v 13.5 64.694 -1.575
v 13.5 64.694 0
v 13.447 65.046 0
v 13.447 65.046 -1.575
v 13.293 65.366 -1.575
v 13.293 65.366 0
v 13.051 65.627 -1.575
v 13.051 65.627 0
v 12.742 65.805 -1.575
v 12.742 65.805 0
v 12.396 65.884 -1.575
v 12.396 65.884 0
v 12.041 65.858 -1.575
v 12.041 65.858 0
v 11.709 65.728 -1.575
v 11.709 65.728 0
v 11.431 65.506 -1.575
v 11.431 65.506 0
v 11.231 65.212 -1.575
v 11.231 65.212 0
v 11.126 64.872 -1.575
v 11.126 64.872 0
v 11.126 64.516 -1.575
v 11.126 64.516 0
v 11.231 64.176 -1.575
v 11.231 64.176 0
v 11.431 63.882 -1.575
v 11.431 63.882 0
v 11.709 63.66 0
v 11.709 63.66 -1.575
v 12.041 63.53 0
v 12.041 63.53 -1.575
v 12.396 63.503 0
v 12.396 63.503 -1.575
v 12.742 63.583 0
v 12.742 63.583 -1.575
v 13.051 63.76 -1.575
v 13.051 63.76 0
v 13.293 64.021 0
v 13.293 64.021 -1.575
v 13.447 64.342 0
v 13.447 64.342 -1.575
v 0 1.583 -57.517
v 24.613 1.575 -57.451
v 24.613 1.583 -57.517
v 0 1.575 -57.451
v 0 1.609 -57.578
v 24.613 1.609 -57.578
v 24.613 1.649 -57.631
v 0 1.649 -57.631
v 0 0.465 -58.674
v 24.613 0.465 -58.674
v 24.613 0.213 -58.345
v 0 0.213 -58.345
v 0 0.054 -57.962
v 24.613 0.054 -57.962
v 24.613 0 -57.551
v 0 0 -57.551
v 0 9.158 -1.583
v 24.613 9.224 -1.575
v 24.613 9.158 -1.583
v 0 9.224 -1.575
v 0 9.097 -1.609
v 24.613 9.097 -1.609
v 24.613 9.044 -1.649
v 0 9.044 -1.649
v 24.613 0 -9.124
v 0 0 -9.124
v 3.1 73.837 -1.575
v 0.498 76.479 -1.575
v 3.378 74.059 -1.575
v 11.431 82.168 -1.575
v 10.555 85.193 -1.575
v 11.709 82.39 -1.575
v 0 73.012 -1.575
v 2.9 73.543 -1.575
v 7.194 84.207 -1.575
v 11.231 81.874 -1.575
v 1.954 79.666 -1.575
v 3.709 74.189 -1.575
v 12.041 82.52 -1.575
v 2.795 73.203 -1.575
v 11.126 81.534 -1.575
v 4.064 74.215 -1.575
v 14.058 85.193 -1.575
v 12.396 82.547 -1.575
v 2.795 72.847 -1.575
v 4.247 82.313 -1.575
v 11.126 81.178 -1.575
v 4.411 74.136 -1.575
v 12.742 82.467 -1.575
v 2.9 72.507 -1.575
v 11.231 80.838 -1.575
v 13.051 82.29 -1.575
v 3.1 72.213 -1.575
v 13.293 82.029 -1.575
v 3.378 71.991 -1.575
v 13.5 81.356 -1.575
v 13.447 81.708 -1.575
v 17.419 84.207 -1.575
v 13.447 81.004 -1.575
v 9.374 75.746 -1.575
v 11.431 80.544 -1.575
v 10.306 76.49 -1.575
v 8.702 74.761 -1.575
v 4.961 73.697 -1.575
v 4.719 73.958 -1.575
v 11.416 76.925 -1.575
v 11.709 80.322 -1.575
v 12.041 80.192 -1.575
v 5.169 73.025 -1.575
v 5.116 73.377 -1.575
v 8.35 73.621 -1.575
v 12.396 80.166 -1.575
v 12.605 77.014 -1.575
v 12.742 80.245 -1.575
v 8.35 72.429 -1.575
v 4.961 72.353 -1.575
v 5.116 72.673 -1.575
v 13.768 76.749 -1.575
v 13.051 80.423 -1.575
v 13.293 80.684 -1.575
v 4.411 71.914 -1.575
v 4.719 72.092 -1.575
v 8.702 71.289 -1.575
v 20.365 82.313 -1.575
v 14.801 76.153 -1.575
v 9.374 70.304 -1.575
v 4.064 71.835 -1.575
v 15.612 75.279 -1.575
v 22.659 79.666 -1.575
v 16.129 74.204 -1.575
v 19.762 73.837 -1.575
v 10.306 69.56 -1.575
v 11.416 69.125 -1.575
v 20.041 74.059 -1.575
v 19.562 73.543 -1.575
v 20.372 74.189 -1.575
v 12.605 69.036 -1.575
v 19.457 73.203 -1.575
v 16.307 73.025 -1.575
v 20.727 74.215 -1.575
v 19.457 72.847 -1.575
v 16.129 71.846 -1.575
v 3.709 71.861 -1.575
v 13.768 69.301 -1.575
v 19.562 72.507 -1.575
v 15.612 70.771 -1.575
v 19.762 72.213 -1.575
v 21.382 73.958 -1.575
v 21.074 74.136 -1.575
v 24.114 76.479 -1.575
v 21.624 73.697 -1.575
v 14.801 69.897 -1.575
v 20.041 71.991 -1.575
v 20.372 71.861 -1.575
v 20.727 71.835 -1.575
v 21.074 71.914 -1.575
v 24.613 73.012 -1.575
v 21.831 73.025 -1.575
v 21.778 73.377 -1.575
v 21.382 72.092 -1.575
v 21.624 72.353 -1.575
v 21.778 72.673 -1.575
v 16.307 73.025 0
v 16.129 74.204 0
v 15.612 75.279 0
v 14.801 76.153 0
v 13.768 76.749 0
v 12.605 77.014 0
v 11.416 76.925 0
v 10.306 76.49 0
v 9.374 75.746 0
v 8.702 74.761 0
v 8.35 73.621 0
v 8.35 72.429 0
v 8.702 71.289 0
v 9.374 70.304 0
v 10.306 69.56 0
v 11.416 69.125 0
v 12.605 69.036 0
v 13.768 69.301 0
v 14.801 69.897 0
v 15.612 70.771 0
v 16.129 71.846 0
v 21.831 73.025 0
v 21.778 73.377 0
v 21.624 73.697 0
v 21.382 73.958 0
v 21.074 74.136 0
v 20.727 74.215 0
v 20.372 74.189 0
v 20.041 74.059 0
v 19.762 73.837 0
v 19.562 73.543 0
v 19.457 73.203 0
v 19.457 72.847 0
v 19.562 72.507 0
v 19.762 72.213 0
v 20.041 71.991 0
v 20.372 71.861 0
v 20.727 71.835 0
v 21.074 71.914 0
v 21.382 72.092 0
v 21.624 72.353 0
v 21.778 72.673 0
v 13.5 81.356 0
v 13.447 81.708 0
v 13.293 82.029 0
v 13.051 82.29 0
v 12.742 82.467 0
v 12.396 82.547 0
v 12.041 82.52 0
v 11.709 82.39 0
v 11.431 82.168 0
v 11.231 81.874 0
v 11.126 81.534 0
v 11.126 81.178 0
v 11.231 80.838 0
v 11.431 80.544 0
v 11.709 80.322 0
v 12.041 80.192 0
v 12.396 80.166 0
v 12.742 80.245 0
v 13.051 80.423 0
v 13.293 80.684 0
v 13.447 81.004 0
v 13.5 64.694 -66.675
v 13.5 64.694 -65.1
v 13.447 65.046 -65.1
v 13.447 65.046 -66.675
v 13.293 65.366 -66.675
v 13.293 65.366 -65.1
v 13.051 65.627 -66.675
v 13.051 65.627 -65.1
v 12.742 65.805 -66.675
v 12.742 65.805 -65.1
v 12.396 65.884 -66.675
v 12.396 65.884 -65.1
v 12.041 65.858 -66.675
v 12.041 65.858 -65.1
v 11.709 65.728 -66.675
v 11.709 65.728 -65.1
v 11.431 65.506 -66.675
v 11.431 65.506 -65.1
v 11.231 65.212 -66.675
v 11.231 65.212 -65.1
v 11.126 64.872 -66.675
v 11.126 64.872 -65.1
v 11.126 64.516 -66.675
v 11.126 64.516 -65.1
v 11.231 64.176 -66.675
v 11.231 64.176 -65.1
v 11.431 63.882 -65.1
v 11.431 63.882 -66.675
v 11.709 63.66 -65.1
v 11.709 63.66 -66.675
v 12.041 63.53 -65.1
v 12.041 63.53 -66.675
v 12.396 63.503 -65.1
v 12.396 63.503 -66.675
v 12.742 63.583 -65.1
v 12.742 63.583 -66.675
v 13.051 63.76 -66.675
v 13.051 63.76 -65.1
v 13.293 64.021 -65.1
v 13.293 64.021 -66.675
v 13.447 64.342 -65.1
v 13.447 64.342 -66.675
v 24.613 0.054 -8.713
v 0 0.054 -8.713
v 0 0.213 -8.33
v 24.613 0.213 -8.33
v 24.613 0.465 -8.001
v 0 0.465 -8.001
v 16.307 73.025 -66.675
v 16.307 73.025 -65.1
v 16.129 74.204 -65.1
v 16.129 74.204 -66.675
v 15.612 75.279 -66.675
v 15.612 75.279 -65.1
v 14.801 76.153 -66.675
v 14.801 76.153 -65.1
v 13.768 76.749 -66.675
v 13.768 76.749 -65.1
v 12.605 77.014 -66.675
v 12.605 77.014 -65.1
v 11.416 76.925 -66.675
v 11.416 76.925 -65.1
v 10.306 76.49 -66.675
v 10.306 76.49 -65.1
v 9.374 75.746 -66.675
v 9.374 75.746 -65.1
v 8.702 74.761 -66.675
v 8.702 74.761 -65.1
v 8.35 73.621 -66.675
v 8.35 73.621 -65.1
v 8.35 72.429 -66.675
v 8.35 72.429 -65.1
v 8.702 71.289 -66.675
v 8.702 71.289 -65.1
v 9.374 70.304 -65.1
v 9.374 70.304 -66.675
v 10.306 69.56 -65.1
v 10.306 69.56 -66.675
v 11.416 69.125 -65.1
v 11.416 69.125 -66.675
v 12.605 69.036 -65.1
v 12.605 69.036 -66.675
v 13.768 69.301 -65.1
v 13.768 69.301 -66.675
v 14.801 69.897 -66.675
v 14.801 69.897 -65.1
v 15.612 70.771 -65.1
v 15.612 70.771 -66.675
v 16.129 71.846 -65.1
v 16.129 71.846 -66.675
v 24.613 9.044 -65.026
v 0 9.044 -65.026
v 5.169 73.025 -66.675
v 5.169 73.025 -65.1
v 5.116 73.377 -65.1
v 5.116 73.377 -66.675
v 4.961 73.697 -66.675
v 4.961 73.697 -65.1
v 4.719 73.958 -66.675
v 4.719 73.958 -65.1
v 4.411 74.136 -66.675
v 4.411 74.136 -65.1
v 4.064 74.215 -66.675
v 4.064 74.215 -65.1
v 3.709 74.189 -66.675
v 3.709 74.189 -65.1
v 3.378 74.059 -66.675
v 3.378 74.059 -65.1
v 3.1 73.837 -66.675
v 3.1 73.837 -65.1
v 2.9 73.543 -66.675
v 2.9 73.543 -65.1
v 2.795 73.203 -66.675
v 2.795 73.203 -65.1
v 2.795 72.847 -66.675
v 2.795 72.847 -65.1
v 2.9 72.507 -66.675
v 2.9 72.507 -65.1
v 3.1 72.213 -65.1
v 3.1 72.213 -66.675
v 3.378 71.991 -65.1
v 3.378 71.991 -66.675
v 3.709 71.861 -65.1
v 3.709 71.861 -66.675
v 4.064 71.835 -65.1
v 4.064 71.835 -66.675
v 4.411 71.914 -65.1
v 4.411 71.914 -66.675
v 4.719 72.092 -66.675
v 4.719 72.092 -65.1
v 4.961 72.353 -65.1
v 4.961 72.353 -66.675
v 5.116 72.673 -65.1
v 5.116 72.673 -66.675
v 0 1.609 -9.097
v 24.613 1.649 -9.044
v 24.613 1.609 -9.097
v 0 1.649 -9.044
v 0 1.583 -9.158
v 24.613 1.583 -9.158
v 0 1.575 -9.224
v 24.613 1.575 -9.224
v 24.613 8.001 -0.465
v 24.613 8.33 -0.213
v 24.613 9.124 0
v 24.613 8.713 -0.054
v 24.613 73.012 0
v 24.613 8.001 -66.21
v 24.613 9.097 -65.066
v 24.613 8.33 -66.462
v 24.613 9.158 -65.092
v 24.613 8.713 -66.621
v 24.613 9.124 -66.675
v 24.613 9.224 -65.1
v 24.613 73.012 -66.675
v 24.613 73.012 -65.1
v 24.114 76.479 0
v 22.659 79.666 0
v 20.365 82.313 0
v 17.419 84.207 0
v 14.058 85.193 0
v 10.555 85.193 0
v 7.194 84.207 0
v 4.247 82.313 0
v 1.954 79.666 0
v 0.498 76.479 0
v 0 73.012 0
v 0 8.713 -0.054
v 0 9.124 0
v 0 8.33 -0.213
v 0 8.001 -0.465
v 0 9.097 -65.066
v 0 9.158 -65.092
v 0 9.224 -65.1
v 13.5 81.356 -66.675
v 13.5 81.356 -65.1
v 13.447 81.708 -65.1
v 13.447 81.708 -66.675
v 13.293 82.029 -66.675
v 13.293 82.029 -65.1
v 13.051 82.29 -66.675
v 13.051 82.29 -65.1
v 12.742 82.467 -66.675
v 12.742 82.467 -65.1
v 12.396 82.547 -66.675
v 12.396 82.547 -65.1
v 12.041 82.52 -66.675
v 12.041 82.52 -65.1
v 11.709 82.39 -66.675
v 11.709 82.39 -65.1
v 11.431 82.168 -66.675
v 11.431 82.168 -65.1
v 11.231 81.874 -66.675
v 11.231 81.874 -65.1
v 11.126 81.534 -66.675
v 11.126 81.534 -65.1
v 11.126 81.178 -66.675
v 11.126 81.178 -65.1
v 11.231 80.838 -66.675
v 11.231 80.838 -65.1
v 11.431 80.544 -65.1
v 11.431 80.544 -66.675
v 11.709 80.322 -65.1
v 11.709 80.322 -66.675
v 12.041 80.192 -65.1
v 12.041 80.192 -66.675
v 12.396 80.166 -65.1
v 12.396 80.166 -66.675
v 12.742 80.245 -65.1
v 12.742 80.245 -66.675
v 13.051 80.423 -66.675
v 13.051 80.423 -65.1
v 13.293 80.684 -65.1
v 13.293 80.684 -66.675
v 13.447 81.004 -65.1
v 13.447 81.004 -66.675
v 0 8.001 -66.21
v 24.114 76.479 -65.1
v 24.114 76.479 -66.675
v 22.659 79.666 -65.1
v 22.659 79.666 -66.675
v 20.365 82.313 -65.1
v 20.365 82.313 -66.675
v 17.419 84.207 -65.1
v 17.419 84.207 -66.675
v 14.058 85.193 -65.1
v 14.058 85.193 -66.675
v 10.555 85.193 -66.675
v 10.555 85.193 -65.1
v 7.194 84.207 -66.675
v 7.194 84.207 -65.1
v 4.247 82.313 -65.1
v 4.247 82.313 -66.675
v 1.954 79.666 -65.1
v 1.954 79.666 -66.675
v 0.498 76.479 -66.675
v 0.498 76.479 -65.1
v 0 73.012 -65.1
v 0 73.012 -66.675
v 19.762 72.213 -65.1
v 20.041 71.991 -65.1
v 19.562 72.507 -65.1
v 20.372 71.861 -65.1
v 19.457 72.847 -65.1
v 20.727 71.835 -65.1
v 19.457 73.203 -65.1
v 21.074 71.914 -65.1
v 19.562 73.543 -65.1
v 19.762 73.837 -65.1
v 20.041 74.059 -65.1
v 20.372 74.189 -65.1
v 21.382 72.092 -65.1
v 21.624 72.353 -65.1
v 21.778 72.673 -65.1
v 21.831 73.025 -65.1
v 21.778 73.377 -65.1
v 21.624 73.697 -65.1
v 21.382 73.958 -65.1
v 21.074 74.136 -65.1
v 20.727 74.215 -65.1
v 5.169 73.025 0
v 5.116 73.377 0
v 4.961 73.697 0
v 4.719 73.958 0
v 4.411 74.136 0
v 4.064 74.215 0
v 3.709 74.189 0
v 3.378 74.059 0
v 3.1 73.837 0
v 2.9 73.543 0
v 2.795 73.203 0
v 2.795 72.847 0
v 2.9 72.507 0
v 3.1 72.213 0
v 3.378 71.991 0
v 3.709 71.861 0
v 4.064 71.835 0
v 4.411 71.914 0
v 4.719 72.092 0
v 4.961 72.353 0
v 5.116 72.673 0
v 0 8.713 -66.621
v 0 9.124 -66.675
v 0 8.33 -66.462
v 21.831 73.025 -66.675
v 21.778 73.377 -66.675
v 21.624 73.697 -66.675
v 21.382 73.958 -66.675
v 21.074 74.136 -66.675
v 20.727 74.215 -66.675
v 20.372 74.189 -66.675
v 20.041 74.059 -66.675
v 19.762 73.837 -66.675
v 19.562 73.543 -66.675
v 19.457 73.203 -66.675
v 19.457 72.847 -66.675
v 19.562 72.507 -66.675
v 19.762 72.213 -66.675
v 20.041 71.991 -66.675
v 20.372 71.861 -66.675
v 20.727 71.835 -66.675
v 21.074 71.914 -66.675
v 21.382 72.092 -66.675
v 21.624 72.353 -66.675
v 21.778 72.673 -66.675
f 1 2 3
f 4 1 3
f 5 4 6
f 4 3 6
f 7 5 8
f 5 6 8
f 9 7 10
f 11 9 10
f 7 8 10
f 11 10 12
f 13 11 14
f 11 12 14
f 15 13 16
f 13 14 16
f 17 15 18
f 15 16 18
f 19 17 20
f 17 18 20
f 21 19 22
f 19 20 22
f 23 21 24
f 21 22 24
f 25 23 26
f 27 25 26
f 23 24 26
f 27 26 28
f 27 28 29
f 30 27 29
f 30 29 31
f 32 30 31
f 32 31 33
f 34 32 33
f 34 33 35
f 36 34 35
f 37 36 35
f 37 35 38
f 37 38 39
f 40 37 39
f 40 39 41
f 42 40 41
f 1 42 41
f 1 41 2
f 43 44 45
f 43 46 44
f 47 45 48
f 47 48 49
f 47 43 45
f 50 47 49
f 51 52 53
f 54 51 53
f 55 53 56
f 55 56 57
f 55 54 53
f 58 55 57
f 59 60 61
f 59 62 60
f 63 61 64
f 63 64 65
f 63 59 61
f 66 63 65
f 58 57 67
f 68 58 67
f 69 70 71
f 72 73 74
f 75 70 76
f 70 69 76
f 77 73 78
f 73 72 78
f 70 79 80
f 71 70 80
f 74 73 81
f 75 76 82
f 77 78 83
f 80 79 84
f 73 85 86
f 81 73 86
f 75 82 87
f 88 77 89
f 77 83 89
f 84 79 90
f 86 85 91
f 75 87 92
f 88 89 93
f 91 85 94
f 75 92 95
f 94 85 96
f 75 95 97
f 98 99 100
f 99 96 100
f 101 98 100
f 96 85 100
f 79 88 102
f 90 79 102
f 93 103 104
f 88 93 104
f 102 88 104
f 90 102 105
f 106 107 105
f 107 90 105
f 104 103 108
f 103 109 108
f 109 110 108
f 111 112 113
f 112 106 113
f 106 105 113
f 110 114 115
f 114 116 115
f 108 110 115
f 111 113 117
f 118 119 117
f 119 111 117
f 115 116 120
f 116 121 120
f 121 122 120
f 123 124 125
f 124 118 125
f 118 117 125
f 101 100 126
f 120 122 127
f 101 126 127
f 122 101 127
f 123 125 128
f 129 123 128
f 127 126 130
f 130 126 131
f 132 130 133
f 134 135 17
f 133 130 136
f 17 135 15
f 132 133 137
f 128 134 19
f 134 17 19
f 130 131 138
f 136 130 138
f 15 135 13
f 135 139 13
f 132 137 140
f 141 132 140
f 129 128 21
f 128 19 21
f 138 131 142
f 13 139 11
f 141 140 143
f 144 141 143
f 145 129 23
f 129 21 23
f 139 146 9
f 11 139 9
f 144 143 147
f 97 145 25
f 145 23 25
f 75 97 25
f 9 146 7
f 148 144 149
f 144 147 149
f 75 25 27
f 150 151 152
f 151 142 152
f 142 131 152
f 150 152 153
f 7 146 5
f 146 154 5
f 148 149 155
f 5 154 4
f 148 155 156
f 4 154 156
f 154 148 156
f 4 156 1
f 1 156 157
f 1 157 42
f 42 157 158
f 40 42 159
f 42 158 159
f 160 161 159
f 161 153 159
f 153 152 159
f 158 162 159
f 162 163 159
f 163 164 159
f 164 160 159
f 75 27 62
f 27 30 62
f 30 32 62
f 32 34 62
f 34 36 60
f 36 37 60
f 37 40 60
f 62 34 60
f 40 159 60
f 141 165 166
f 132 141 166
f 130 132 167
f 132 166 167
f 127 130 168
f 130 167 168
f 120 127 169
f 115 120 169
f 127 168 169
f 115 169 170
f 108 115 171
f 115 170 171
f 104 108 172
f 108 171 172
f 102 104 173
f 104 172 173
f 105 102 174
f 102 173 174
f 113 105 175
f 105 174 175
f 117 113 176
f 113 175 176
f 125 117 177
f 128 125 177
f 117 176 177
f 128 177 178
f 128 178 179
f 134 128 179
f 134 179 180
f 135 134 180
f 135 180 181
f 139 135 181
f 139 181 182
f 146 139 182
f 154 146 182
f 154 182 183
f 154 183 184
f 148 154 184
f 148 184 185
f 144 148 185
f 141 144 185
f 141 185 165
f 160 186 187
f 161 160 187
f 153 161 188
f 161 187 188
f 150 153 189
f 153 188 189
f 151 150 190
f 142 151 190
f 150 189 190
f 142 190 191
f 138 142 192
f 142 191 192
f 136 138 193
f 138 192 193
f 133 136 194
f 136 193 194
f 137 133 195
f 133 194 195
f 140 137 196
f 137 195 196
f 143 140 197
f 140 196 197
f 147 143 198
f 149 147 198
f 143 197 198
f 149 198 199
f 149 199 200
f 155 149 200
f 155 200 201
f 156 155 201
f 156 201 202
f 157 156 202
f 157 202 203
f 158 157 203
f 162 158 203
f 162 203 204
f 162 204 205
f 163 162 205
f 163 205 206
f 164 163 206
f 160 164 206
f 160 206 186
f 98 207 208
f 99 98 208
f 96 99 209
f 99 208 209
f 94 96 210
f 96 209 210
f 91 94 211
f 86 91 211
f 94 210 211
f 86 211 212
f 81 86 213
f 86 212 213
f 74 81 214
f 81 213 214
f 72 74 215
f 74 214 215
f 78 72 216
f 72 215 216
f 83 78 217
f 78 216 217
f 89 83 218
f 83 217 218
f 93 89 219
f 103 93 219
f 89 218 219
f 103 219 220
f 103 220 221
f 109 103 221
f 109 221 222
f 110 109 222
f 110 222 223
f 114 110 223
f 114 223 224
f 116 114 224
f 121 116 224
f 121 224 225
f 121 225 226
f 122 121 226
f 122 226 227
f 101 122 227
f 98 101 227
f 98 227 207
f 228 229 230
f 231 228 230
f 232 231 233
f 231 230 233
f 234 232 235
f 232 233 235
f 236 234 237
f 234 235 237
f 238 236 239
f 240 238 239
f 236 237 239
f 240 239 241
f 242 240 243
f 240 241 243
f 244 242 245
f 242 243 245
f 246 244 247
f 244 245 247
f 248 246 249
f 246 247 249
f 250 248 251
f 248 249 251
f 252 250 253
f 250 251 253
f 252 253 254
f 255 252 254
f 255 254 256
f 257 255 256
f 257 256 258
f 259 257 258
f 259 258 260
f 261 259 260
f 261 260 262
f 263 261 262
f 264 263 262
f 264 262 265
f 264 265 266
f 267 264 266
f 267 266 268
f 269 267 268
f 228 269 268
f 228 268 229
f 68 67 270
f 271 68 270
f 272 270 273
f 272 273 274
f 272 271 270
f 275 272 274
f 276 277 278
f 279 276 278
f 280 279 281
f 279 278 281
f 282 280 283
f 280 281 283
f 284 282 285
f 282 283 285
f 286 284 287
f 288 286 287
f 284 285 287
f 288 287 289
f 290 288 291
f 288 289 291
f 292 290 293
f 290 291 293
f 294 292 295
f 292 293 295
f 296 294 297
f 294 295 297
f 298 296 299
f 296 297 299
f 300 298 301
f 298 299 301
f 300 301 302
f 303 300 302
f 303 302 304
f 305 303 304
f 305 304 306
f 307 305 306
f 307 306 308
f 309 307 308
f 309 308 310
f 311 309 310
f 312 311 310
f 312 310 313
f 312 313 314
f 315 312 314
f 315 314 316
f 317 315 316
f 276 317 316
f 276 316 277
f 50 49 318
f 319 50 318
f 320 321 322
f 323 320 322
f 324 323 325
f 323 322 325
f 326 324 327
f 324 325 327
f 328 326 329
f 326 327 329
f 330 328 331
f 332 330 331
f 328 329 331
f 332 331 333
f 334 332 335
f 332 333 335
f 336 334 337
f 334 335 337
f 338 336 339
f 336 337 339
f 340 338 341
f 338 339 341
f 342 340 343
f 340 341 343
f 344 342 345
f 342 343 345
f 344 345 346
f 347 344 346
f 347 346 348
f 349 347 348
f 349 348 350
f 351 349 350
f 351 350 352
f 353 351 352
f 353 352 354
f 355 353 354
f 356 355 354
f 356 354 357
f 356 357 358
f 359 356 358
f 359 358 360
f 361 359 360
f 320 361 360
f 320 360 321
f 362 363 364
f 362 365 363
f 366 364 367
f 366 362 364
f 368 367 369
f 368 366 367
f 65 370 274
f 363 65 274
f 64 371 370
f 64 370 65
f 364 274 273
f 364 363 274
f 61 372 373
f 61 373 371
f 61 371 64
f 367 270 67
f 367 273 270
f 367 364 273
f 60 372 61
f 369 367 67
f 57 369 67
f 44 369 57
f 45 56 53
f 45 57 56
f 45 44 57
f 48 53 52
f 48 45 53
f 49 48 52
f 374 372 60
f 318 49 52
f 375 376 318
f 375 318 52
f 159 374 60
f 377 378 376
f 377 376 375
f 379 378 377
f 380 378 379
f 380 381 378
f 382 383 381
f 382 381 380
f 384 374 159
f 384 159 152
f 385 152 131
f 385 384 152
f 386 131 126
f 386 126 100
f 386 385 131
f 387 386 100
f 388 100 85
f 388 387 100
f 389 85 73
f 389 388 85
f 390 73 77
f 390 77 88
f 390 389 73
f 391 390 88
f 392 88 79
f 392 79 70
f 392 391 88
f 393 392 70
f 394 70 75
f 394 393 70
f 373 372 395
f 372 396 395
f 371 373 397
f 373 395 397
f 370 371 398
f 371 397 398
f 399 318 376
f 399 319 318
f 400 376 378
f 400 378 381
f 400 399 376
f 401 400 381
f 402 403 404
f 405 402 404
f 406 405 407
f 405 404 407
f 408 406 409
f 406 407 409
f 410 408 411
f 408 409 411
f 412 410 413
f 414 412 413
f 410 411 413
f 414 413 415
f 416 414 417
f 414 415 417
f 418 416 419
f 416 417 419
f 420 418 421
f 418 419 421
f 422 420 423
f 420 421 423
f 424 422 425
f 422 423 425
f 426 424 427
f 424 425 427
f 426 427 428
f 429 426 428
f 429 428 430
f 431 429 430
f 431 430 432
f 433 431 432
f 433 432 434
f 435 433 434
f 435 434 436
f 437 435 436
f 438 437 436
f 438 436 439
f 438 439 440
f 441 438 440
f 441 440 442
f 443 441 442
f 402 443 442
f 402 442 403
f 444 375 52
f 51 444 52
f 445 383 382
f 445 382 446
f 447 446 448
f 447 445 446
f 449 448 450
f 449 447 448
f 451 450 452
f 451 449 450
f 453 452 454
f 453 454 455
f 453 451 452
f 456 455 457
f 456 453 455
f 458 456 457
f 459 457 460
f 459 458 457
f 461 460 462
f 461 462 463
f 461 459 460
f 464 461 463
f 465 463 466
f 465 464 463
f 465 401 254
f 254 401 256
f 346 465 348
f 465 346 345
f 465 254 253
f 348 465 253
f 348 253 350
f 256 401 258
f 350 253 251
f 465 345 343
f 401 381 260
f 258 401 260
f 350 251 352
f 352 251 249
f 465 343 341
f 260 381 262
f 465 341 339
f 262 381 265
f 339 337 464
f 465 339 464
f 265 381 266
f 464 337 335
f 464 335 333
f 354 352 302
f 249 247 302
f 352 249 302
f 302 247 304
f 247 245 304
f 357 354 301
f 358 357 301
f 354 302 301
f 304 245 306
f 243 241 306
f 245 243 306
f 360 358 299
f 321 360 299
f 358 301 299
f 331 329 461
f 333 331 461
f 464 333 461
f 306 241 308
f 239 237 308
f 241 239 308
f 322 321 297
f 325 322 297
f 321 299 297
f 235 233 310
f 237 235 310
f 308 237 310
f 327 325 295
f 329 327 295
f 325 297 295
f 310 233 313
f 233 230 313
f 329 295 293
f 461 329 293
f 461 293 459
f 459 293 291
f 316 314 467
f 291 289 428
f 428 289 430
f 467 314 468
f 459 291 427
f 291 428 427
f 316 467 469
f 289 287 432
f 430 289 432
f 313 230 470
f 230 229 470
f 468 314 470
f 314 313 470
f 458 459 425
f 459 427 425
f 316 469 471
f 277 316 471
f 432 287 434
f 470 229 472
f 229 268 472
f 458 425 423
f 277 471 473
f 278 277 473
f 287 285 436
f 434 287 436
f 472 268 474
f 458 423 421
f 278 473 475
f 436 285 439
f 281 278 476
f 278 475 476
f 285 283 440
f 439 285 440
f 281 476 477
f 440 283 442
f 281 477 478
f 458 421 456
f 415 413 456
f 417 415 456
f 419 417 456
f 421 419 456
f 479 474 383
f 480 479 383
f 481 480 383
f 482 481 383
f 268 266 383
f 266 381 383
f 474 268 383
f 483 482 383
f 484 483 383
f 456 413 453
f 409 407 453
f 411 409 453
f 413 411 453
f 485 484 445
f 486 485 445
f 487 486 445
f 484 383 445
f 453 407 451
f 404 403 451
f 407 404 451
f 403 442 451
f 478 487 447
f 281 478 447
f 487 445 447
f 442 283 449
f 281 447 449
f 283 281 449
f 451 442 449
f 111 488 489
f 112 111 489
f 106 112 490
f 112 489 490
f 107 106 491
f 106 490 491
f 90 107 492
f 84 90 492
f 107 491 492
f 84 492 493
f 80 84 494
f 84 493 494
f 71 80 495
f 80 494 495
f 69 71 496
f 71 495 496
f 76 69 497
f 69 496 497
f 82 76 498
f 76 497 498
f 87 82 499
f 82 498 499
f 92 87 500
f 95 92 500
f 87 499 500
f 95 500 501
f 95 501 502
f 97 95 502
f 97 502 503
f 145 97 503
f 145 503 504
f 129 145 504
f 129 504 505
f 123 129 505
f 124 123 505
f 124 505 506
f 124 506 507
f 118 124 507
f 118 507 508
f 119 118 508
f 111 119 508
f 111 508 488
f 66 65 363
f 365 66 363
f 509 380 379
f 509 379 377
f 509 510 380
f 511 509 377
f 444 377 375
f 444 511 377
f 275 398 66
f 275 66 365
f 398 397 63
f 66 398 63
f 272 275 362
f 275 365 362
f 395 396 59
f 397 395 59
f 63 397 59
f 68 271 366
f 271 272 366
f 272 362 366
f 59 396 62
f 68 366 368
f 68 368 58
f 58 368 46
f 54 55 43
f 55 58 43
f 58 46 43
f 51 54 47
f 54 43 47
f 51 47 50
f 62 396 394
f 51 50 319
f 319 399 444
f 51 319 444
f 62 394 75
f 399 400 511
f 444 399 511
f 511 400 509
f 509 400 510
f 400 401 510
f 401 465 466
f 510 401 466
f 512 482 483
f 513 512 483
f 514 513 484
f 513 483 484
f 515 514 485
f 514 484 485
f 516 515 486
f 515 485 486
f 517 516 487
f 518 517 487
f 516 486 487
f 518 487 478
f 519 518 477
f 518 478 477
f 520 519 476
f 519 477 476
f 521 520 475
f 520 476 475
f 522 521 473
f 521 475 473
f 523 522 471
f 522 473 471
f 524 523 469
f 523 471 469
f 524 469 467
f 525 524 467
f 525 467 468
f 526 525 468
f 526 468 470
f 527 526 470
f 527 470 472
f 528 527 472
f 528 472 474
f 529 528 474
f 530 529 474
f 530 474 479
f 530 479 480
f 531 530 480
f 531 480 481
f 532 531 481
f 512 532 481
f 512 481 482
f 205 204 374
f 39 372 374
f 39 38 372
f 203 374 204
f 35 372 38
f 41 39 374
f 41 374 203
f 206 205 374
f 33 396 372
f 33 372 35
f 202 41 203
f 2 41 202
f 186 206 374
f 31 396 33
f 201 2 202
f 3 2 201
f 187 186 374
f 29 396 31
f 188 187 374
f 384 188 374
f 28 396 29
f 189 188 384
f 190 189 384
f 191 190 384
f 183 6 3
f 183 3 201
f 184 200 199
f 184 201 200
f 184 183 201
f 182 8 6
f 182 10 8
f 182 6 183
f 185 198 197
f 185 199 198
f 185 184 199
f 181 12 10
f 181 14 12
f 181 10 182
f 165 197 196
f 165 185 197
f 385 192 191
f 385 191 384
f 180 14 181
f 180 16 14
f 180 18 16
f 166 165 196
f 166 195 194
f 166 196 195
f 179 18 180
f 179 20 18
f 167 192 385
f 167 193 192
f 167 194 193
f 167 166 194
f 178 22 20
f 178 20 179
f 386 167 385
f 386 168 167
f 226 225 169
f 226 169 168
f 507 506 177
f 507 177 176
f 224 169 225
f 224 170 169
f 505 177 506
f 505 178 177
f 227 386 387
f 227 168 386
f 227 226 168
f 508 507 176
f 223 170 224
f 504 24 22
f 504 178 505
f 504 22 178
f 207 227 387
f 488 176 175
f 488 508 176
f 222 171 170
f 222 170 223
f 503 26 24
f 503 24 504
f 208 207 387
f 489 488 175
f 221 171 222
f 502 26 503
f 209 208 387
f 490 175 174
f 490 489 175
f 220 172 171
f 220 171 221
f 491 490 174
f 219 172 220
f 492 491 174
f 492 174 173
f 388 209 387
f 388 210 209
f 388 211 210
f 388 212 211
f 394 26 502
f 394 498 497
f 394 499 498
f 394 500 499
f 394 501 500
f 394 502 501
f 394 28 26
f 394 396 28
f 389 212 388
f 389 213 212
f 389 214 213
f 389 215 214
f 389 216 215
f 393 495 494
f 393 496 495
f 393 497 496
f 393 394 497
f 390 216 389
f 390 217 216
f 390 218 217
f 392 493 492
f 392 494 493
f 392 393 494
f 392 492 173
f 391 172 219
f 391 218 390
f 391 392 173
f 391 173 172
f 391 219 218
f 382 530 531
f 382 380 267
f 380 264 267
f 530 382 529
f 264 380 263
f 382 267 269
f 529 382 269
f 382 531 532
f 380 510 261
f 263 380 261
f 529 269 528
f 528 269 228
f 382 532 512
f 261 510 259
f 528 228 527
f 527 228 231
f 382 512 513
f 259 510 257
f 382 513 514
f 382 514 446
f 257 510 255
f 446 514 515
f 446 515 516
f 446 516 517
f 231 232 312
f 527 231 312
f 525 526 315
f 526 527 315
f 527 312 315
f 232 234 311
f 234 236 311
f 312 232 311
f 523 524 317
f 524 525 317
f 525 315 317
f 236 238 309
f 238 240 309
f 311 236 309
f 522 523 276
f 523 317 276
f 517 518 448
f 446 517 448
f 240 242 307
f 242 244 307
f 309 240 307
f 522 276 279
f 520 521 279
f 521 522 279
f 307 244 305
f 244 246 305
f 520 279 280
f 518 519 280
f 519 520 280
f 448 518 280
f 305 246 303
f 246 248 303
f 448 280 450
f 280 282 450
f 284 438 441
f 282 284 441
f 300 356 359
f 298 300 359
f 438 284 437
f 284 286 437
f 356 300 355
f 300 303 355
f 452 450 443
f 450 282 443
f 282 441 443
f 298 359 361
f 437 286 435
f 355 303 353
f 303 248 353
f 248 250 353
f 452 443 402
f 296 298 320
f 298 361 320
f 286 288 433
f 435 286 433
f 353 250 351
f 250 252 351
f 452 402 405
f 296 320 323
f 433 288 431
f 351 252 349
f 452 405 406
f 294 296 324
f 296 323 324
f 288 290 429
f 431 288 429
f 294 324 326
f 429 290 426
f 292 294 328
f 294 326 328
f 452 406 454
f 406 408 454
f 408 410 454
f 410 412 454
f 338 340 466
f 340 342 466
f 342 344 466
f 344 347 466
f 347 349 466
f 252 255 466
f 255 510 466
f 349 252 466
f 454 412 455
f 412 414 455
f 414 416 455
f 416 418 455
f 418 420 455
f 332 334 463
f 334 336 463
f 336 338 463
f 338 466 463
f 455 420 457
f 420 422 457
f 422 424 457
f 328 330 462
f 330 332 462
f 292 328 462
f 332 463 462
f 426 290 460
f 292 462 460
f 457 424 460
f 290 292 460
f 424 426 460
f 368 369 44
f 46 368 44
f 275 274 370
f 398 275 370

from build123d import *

# Parameters (mm, degrees)
SKETCH2_W         = 66.675
SKETCH2_H         = 85.3186
EXTRUDE1_DEPTH    = 24.6126
SKETCH3_OUTSIDE_W = 90.883
SKETCH3_OUTSIDE_H = 109.527
EXTRUDE2_DEPTH    = 24.6126
SKETCH4_OUTSIDE_W = 48.821
SKETCH4_OUTSIDE_H = 109.527
EXTRUDE3_DEPTH    = 67.675
FILLET1_R         = 1.5875
FILLET2_R         = 0.254
SKETCH5_R         = 4.0005
SKETCH5_R_2       = 1.1938
EXTRUDE4_DEPTH    = 67.675


with BuildPart() as part:
    # Sketch2 → Extrude1 (new body)
    with BuildSketch(Plane(origin=(0, 0, 0), x_dir=(0, 0, -1), z_dir=(1, 0, 0))):
        with Locations((33.3375, 42.6593)):
            Rectangle(SKETCH2_W, SKETCH2_H)
    extrude(amount=EXTRUDE1_DEPTH)

    # Sketch3 outside → Extrude2 (cut)
    with BuildSketch(Plane(origin=(24.6126, 0, 0), x_dir=(0, 0, -1), z_dir=(1, 0, 0))):
        with Locations((33.3375, 42.6595)):
            Rectangle(SKETCH3_OUTSIDE_W, SKETCH3_OUTSIDE_H)
        Polygon((1.5748, 85.3186), (1.5748, 9.1186), (9.1186, 1.5748), (57.5564, 1.5748), (65.1002, 9.1186), (65.1002, 85.3186), (66.675, 85.3186), (66.675, 8.466296482), (58.208703518, 0), (8.466296482, 0), (0, 8.466296482), (0, 85.3186), align=None, mode=Mode.SUBTRACT)
    extrude(amount=-EXTRUDE2_DEPTH, mode=Mode.SUBTRACT)

    # Sketch4 outside → Extrude3 (cut, through all)
    with BuildSketch(Plane.XY):
        with Locations((12.3065, 42.6595)):
            Rectangle(SKETCH4_OUTSIDE_W, SKETCH4_OUTSIDE_H)
        with BuildLine():
            Line((0, 73.0123), (0, 0))
            Line((0, 0), (24.6126, 0))
            Line((24.6126, 0), (24.6126, 73.0123))
            ThreePointArc((24.6126, 73.0123), (12.3063, 85.3186), (0, 73.0123))
        make_face(mode=Mode.SUBTRACT)
    extrude(amount=-EXTRUDE3_DEPTH, mode=Mode.SUBTRACT)

    # Fillet1
    fillet1_edges = [part.edges().sort_by_distance(p)[0] for p in [
        (12.3063, 8.466296482, -66.675),
        (12.3063, 0, -58.208703518),
        (12.3063, 0, -8.466296482),
        (12.3063, 8.466296482, 0),
    ]]
    fillet(fillet1_edges, radius=FILLET1_R)

    # Fillet2
    fillet2_edges = [part.edges().sort_by_distance(p)[0] for p in [
        (12.3063, 9.1186, -1.5748),
        (12.3063, 1.5748, -9.1186),
        (12.3063, 1.5748, -57.5564),
        (12.3063, 9.1186, -65.1002),
    ]]
    fillet(fillet2_edges, radius=FILLET2_R)

    # Sketch5 → Extrude4 (cut, through all)
    with BuildSketch(Plane.XY):
        with Locations((12.3063, 73.025)):
            Circle(SKETCH5_R)
        with Locations((12.3063, 81.3562)):
            Circle(SKETCH5_R_2)
        with Locations((3.9751, 73.025)):
            Circle(SKETCH5_R_2)
        with Locations((12.3063, 64.6938)):
            Circle(SKETCH5_R_2)
        with Locations((20.6375, 73.025)):
            Circle(SKETCH5_R_2)
    extrude(amount=-EXTRUDE4_DEPTH, mode=Mode.SUBTRACT)


solid = part.part
